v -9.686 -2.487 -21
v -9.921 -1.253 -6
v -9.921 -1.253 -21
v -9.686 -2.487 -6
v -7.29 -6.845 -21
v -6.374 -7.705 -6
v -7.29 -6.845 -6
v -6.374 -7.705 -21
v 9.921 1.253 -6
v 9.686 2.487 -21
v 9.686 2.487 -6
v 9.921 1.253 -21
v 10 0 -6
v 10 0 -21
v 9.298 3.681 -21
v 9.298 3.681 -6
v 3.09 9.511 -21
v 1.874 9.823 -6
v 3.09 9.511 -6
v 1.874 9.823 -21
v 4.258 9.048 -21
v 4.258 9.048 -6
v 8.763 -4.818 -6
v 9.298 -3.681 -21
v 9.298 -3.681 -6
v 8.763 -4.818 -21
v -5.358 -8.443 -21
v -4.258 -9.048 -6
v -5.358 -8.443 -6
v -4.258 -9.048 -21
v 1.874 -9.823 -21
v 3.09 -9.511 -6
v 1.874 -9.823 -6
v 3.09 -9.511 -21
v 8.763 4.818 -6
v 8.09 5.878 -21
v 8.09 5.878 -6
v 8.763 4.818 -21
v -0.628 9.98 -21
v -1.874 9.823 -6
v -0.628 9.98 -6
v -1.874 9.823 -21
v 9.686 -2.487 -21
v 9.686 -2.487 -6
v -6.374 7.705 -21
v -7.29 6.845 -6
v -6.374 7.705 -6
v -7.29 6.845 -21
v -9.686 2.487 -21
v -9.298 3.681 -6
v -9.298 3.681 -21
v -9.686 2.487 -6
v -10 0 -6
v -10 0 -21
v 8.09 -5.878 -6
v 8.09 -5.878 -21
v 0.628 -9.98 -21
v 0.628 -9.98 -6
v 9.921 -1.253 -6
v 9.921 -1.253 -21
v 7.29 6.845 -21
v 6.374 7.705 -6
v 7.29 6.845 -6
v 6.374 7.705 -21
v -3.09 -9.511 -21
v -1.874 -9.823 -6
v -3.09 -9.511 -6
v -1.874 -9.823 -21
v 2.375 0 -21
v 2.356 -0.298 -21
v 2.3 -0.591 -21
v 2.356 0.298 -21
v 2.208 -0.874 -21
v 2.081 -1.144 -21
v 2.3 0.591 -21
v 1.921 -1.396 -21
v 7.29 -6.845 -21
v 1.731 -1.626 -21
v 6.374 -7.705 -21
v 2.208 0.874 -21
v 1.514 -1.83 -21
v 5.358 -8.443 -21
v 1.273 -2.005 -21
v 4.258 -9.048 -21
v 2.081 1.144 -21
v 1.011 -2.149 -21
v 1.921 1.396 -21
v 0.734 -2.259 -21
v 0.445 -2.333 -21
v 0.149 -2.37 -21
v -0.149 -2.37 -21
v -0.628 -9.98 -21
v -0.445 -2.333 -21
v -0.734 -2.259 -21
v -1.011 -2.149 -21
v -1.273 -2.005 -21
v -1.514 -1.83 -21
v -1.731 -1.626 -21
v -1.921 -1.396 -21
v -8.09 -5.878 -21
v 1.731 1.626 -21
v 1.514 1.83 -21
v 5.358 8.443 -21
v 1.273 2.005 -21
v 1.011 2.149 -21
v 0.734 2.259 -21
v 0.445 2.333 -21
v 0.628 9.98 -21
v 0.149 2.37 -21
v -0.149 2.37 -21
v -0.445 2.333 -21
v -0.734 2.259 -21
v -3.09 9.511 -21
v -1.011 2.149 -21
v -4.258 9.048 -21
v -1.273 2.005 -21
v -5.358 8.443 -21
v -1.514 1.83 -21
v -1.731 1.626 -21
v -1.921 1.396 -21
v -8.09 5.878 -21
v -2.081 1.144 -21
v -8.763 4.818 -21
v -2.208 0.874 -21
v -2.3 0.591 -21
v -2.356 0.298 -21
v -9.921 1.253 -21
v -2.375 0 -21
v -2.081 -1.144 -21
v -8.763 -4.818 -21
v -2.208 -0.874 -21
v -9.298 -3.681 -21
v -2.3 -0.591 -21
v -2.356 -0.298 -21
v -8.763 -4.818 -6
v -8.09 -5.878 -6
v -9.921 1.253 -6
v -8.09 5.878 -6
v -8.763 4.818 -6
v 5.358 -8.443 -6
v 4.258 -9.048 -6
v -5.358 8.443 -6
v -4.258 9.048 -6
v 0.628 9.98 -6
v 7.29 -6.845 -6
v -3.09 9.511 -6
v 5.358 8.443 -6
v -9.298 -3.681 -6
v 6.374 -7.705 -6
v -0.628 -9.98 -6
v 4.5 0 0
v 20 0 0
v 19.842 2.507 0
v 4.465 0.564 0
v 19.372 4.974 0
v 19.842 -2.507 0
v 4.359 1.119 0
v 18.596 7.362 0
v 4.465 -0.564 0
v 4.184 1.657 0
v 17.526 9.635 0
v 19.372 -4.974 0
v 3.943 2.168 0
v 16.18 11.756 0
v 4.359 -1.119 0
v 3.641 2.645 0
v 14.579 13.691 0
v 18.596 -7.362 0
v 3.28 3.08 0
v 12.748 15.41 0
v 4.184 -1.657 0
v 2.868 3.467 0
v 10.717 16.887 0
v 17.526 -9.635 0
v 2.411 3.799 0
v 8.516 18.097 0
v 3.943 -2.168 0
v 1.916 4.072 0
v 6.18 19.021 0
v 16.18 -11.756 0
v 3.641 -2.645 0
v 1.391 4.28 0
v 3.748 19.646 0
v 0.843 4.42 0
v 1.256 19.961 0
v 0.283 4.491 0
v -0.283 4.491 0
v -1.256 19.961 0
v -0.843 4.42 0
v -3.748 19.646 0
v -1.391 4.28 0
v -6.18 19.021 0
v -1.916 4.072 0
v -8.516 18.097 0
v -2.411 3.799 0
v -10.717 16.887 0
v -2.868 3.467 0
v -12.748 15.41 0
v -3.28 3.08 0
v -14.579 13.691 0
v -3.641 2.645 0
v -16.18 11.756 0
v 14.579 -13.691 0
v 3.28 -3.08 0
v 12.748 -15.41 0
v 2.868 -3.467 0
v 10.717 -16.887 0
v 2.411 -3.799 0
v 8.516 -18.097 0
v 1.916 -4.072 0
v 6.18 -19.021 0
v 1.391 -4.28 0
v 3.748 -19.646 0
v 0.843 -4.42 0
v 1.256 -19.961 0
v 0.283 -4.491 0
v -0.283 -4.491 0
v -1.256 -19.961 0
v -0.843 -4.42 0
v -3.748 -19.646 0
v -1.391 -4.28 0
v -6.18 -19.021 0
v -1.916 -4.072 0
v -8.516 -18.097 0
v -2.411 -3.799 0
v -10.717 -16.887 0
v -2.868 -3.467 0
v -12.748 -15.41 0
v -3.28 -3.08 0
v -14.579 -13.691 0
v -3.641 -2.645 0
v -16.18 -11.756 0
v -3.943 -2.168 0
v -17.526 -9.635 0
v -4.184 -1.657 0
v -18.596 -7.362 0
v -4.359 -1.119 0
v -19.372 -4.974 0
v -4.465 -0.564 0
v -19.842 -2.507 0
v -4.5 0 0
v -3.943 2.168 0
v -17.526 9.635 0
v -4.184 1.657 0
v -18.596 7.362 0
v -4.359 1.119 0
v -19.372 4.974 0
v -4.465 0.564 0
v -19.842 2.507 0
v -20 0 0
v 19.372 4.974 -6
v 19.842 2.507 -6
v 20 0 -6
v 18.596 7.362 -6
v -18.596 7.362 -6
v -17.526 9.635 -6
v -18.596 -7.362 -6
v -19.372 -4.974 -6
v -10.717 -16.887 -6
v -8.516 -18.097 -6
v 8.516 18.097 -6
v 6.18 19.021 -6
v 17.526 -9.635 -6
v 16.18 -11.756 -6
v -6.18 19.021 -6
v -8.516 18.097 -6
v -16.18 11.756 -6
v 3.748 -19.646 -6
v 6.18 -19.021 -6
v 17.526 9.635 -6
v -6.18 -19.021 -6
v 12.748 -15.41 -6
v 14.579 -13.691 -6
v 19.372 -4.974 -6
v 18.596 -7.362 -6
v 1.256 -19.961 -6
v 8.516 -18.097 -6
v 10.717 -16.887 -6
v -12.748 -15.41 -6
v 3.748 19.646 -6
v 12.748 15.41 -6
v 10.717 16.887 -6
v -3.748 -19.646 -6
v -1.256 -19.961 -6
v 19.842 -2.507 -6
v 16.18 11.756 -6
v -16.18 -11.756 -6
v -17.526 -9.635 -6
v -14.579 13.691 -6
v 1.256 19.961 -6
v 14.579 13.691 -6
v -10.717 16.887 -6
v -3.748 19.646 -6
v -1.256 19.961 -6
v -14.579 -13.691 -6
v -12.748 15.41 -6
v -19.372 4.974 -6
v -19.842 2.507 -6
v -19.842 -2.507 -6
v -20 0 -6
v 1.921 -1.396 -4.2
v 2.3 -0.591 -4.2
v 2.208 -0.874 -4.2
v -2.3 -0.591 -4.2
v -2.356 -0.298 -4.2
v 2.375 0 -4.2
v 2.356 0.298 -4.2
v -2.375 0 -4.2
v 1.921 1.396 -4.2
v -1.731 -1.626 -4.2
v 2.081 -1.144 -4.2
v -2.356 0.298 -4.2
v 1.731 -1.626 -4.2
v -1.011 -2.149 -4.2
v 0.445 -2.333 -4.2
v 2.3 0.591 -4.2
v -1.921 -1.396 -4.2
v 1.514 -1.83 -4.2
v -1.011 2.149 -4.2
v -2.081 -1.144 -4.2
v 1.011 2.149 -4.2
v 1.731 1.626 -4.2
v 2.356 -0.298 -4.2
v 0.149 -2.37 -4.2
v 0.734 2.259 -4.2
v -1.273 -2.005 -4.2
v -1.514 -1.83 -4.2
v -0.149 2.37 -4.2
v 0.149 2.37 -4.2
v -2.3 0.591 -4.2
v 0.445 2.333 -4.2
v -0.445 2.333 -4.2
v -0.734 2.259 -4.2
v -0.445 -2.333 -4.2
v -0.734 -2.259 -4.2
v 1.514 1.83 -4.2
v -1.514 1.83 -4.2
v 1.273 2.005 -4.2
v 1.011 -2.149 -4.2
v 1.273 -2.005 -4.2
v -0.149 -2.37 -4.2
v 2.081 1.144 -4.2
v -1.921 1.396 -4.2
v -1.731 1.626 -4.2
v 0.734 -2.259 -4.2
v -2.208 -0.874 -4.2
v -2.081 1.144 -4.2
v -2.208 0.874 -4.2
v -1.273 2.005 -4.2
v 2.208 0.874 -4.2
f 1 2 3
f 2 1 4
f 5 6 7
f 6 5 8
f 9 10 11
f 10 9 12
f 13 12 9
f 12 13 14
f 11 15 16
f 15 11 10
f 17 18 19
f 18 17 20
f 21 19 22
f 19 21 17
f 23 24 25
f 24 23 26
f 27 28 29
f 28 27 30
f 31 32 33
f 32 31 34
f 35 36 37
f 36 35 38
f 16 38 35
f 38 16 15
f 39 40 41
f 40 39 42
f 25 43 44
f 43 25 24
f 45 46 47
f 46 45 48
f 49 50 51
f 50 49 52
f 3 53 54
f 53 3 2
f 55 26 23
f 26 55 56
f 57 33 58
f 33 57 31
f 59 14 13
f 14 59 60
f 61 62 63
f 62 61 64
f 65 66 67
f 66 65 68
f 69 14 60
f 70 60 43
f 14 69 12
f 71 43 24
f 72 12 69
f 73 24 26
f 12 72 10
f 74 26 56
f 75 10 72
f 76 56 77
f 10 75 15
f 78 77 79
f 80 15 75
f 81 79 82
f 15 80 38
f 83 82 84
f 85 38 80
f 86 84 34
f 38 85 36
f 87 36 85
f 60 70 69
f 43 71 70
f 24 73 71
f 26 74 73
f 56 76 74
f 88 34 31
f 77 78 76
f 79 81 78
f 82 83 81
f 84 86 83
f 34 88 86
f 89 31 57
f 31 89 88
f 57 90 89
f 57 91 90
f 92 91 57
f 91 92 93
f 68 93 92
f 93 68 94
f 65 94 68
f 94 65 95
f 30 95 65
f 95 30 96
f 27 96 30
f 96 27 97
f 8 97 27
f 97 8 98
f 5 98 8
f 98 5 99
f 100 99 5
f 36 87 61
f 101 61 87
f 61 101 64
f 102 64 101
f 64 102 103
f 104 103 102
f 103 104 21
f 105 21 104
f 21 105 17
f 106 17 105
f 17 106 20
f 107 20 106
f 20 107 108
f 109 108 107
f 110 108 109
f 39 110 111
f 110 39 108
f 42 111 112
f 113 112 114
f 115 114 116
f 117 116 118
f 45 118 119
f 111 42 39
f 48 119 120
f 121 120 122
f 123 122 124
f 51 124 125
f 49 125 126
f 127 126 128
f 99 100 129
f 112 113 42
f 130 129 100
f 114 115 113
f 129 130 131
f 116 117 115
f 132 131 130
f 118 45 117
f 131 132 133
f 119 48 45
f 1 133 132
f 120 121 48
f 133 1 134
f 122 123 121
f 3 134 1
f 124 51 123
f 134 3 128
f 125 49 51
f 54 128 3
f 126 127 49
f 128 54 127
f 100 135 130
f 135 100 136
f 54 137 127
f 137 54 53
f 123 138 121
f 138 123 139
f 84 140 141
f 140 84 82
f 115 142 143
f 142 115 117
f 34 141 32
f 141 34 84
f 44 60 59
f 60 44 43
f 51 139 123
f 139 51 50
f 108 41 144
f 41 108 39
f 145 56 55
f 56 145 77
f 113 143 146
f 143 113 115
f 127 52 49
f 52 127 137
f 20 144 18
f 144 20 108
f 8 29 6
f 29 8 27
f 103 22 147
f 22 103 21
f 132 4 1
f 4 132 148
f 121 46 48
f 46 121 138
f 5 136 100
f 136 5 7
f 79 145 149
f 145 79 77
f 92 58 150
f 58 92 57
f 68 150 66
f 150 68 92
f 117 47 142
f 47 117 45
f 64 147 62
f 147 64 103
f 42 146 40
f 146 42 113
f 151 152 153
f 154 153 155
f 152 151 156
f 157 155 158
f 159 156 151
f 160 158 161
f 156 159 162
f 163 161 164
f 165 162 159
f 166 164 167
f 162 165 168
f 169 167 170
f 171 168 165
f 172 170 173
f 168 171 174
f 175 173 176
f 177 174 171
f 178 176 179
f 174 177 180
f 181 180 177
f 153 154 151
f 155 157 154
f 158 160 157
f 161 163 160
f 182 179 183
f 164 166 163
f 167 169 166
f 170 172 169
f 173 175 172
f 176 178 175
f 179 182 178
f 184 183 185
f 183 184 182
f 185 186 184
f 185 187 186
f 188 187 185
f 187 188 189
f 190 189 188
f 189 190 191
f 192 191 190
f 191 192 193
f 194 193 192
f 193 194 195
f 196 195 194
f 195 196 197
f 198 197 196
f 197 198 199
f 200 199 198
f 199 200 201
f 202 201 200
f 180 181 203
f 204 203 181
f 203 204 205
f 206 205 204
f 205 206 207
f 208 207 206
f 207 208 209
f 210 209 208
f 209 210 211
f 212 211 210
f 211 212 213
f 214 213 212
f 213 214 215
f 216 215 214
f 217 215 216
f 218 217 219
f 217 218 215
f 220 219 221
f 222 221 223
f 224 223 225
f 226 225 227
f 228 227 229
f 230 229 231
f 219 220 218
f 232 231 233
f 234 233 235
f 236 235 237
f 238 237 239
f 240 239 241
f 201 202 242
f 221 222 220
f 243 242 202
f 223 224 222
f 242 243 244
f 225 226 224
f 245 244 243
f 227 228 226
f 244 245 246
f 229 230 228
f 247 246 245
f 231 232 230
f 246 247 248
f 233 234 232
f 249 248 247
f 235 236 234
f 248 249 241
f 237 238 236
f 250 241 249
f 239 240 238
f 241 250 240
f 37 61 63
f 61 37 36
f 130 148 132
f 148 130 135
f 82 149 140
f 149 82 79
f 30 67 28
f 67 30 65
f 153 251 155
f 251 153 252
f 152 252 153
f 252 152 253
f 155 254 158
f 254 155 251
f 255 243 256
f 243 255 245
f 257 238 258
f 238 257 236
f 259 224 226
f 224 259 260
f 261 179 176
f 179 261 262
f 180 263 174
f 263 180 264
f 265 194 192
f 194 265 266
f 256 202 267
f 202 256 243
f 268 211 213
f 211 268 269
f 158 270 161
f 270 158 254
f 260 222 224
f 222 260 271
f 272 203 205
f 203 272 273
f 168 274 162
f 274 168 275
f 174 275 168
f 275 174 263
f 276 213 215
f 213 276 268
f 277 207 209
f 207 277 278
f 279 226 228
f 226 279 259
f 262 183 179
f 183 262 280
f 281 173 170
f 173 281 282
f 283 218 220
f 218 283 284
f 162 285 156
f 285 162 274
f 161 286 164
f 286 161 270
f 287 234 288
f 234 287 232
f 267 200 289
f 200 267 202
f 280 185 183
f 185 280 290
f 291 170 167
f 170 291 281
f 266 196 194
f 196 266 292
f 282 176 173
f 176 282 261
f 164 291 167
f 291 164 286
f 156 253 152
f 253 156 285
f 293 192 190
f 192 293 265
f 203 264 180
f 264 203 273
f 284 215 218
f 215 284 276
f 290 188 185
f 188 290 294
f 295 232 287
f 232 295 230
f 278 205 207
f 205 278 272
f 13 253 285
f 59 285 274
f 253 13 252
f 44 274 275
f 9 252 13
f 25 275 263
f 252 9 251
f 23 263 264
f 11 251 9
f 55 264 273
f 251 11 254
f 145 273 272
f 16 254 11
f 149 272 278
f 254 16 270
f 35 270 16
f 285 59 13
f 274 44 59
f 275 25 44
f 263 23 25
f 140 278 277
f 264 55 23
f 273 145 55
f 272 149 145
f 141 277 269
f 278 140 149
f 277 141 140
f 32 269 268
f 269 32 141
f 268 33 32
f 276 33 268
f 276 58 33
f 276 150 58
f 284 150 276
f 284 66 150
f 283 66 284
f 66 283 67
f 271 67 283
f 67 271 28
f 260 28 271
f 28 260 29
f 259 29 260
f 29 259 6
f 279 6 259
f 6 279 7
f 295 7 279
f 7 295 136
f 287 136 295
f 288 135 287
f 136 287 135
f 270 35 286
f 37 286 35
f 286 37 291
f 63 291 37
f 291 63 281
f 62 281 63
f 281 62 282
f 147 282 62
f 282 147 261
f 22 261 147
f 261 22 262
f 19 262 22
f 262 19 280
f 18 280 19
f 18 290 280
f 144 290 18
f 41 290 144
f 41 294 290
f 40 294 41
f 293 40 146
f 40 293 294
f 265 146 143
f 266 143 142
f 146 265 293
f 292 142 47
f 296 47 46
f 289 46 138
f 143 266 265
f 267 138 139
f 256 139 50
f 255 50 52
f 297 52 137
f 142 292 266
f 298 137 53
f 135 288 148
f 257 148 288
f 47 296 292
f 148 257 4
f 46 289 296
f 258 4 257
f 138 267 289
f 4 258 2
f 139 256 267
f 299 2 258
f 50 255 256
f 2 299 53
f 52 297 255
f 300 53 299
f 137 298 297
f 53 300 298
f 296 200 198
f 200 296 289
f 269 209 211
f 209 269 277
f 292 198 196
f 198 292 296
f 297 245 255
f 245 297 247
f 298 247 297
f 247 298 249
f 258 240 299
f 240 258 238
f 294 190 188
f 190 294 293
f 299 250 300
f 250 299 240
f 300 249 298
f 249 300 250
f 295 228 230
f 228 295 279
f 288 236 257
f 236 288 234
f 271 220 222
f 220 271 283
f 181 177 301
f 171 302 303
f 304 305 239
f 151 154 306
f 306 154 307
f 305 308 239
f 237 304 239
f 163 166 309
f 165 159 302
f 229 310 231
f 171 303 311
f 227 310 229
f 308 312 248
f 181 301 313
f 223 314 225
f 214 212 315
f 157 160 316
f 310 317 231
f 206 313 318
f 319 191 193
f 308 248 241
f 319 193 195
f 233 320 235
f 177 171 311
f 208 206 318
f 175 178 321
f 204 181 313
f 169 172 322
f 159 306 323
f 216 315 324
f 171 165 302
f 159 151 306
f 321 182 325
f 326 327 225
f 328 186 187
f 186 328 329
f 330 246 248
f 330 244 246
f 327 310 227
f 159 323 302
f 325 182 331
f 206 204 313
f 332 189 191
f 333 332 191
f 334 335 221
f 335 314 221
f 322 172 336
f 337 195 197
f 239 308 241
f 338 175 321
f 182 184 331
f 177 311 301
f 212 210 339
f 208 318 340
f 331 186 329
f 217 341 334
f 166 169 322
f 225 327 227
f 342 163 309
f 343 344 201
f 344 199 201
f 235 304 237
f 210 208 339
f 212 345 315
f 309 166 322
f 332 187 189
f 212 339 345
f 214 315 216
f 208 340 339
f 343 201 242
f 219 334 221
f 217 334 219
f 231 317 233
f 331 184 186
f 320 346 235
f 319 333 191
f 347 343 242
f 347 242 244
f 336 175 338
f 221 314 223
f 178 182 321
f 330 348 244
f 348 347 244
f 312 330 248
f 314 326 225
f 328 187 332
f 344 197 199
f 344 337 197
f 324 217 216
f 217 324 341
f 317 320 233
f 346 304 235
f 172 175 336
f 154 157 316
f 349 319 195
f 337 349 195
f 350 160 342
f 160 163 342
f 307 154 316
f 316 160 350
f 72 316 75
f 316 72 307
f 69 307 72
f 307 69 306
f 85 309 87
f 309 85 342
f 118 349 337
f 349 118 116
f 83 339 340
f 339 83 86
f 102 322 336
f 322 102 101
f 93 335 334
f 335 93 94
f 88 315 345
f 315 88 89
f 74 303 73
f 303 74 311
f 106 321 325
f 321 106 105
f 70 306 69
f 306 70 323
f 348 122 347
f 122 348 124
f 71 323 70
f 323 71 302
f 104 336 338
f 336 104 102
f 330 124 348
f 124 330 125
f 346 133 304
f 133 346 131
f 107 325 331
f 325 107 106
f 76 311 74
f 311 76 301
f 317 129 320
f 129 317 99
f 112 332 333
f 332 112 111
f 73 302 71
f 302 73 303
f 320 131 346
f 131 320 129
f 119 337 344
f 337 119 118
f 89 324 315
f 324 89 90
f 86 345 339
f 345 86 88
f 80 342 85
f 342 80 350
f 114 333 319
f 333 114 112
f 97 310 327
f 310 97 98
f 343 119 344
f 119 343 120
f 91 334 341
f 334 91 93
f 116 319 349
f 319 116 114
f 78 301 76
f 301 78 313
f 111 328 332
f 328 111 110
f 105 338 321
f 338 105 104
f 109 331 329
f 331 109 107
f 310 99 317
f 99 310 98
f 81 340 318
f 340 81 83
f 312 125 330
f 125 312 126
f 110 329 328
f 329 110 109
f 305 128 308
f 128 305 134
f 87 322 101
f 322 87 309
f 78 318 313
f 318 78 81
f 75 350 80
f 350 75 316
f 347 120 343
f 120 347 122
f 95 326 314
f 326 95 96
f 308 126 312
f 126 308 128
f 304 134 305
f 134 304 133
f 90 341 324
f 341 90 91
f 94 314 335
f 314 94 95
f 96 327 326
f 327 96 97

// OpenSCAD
$fn = 50;


difference() {
	union() {
		translate(v = [0, 0, -21.0000000000]) {
			cylinder(h = 21, r = 10.0000000000);
		}
		translate(v = [0, 0, -6.0000000000]) {
			cylinder(h = 6, r = 20.0000000000);
		}
	}
	union() {
		translate(v = [0, 0, 0]) {
			rotate(a = [0, 0, 0]) {
				difference() {
					union() {
						#translate(v = [0, 0, -21.0000000000]) {
							cylinder(h = 21, r = 2.2500000000);
						}
						#translate(v = [0, 0, -4.2000000000]) {
							cylinder(h = 4.2000000000, r = 10.0000000000, r1 = 2.3750000000, r2 = 4.5000000000);
						}
						#translate(v = [0, 0, -21.0000000000]) {
							cylinder(h = 21, r = 2.3750000000);
						}
						#translate(v = [0, 0, -21.0000000000]) {
							cylinder(h = 21, r = 2.2500000000);
						}
					}
					union();
				}
			}
		}
	}
}
